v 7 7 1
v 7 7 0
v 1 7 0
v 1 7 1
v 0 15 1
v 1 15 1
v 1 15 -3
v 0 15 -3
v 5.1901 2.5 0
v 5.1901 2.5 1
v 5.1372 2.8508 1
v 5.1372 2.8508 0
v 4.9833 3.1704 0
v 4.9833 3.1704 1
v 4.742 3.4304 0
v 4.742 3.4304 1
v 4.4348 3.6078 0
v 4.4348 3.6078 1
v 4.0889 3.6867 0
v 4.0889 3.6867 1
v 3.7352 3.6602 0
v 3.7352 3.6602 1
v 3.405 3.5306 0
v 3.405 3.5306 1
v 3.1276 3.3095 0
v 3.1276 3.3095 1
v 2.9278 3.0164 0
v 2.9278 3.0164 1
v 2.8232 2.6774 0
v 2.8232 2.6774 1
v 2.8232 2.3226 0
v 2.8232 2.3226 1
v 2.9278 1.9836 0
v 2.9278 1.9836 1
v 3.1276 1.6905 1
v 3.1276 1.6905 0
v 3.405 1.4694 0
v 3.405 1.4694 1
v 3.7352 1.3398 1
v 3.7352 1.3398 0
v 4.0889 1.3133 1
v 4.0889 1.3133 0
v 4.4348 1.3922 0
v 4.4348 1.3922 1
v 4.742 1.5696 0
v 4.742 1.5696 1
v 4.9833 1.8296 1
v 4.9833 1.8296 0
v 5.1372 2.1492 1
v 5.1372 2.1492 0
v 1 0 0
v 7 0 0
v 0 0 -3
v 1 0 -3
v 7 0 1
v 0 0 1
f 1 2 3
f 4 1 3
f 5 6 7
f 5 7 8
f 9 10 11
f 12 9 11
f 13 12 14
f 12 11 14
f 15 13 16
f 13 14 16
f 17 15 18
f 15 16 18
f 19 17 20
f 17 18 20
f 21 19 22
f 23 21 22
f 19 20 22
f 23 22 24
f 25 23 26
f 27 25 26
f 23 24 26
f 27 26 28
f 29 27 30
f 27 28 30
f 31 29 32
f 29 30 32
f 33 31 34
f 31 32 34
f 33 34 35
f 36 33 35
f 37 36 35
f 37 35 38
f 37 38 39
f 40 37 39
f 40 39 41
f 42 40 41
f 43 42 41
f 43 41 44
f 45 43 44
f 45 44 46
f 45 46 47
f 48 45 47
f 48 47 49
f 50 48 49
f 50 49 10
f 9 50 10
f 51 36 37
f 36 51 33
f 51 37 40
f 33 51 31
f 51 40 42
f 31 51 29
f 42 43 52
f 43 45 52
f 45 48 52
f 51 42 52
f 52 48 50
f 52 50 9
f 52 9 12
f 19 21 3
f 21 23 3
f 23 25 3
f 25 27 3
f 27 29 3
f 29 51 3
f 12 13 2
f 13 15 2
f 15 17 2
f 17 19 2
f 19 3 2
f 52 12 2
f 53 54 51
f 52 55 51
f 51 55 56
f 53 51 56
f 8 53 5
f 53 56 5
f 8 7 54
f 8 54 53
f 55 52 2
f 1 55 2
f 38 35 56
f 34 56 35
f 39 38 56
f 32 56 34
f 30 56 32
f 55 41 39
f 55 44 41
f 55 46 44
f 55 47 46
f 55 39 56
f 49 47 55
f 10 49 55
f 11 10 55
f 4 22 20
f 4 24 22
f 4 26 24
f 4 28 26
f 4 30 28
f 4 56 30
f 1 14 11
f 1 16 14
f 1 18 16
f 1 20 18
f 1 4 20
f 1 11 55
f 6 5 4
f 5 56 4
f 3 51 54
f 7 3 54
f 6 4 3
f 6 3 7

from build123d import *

# Parameters (mm, degrees)
BOSS_EXTRUDE1_DEPTH = 1
SKETCH2_W           = 1
SKETCH2_H           = 15
BOSS_EXTRUDE2_DEPTH = 3
SKETCH4_R           = 1.190073959
CUT_EXTRUDE1_DEPTH  = 3


with BuildPart() as part:
    # Sketch1 → Boss-Extrude1 (new body)
    with BuildSketch(Plane.XY):
        Polygon((0, 0), (7, 0), (7, 7), (1, 7), (1, 15), (0, 15), align=None)
    extrude(amount=BOSS_EXTRUDE1_DEPTH)

    # Sketch2 → Boss-Extrude2 (add)
    with BuildSketch(Plane(origin=(0, 0, 0), x_dir=(-1, 0, 0), z_dir=(0, 0, -1))):
        with Locations((-0.5, 7.5)):
            Rectangle(SKETCH2_W, SKETCH2_H)
    extrude(amount=BOSS_EXTRUDE2_DEPTH)

    # Sketch4 → Cut-Extrude1 (cut)
    with BuildSketch(Plane.XY.offset(1)):
        with Locations((4, 2.5)):
            Circle(SKETCH4_R)
    extrude(amount=-CUT_EXTRUDE1_DEPTH, mode=Mode.SUBTRACT)


solid = part.part
